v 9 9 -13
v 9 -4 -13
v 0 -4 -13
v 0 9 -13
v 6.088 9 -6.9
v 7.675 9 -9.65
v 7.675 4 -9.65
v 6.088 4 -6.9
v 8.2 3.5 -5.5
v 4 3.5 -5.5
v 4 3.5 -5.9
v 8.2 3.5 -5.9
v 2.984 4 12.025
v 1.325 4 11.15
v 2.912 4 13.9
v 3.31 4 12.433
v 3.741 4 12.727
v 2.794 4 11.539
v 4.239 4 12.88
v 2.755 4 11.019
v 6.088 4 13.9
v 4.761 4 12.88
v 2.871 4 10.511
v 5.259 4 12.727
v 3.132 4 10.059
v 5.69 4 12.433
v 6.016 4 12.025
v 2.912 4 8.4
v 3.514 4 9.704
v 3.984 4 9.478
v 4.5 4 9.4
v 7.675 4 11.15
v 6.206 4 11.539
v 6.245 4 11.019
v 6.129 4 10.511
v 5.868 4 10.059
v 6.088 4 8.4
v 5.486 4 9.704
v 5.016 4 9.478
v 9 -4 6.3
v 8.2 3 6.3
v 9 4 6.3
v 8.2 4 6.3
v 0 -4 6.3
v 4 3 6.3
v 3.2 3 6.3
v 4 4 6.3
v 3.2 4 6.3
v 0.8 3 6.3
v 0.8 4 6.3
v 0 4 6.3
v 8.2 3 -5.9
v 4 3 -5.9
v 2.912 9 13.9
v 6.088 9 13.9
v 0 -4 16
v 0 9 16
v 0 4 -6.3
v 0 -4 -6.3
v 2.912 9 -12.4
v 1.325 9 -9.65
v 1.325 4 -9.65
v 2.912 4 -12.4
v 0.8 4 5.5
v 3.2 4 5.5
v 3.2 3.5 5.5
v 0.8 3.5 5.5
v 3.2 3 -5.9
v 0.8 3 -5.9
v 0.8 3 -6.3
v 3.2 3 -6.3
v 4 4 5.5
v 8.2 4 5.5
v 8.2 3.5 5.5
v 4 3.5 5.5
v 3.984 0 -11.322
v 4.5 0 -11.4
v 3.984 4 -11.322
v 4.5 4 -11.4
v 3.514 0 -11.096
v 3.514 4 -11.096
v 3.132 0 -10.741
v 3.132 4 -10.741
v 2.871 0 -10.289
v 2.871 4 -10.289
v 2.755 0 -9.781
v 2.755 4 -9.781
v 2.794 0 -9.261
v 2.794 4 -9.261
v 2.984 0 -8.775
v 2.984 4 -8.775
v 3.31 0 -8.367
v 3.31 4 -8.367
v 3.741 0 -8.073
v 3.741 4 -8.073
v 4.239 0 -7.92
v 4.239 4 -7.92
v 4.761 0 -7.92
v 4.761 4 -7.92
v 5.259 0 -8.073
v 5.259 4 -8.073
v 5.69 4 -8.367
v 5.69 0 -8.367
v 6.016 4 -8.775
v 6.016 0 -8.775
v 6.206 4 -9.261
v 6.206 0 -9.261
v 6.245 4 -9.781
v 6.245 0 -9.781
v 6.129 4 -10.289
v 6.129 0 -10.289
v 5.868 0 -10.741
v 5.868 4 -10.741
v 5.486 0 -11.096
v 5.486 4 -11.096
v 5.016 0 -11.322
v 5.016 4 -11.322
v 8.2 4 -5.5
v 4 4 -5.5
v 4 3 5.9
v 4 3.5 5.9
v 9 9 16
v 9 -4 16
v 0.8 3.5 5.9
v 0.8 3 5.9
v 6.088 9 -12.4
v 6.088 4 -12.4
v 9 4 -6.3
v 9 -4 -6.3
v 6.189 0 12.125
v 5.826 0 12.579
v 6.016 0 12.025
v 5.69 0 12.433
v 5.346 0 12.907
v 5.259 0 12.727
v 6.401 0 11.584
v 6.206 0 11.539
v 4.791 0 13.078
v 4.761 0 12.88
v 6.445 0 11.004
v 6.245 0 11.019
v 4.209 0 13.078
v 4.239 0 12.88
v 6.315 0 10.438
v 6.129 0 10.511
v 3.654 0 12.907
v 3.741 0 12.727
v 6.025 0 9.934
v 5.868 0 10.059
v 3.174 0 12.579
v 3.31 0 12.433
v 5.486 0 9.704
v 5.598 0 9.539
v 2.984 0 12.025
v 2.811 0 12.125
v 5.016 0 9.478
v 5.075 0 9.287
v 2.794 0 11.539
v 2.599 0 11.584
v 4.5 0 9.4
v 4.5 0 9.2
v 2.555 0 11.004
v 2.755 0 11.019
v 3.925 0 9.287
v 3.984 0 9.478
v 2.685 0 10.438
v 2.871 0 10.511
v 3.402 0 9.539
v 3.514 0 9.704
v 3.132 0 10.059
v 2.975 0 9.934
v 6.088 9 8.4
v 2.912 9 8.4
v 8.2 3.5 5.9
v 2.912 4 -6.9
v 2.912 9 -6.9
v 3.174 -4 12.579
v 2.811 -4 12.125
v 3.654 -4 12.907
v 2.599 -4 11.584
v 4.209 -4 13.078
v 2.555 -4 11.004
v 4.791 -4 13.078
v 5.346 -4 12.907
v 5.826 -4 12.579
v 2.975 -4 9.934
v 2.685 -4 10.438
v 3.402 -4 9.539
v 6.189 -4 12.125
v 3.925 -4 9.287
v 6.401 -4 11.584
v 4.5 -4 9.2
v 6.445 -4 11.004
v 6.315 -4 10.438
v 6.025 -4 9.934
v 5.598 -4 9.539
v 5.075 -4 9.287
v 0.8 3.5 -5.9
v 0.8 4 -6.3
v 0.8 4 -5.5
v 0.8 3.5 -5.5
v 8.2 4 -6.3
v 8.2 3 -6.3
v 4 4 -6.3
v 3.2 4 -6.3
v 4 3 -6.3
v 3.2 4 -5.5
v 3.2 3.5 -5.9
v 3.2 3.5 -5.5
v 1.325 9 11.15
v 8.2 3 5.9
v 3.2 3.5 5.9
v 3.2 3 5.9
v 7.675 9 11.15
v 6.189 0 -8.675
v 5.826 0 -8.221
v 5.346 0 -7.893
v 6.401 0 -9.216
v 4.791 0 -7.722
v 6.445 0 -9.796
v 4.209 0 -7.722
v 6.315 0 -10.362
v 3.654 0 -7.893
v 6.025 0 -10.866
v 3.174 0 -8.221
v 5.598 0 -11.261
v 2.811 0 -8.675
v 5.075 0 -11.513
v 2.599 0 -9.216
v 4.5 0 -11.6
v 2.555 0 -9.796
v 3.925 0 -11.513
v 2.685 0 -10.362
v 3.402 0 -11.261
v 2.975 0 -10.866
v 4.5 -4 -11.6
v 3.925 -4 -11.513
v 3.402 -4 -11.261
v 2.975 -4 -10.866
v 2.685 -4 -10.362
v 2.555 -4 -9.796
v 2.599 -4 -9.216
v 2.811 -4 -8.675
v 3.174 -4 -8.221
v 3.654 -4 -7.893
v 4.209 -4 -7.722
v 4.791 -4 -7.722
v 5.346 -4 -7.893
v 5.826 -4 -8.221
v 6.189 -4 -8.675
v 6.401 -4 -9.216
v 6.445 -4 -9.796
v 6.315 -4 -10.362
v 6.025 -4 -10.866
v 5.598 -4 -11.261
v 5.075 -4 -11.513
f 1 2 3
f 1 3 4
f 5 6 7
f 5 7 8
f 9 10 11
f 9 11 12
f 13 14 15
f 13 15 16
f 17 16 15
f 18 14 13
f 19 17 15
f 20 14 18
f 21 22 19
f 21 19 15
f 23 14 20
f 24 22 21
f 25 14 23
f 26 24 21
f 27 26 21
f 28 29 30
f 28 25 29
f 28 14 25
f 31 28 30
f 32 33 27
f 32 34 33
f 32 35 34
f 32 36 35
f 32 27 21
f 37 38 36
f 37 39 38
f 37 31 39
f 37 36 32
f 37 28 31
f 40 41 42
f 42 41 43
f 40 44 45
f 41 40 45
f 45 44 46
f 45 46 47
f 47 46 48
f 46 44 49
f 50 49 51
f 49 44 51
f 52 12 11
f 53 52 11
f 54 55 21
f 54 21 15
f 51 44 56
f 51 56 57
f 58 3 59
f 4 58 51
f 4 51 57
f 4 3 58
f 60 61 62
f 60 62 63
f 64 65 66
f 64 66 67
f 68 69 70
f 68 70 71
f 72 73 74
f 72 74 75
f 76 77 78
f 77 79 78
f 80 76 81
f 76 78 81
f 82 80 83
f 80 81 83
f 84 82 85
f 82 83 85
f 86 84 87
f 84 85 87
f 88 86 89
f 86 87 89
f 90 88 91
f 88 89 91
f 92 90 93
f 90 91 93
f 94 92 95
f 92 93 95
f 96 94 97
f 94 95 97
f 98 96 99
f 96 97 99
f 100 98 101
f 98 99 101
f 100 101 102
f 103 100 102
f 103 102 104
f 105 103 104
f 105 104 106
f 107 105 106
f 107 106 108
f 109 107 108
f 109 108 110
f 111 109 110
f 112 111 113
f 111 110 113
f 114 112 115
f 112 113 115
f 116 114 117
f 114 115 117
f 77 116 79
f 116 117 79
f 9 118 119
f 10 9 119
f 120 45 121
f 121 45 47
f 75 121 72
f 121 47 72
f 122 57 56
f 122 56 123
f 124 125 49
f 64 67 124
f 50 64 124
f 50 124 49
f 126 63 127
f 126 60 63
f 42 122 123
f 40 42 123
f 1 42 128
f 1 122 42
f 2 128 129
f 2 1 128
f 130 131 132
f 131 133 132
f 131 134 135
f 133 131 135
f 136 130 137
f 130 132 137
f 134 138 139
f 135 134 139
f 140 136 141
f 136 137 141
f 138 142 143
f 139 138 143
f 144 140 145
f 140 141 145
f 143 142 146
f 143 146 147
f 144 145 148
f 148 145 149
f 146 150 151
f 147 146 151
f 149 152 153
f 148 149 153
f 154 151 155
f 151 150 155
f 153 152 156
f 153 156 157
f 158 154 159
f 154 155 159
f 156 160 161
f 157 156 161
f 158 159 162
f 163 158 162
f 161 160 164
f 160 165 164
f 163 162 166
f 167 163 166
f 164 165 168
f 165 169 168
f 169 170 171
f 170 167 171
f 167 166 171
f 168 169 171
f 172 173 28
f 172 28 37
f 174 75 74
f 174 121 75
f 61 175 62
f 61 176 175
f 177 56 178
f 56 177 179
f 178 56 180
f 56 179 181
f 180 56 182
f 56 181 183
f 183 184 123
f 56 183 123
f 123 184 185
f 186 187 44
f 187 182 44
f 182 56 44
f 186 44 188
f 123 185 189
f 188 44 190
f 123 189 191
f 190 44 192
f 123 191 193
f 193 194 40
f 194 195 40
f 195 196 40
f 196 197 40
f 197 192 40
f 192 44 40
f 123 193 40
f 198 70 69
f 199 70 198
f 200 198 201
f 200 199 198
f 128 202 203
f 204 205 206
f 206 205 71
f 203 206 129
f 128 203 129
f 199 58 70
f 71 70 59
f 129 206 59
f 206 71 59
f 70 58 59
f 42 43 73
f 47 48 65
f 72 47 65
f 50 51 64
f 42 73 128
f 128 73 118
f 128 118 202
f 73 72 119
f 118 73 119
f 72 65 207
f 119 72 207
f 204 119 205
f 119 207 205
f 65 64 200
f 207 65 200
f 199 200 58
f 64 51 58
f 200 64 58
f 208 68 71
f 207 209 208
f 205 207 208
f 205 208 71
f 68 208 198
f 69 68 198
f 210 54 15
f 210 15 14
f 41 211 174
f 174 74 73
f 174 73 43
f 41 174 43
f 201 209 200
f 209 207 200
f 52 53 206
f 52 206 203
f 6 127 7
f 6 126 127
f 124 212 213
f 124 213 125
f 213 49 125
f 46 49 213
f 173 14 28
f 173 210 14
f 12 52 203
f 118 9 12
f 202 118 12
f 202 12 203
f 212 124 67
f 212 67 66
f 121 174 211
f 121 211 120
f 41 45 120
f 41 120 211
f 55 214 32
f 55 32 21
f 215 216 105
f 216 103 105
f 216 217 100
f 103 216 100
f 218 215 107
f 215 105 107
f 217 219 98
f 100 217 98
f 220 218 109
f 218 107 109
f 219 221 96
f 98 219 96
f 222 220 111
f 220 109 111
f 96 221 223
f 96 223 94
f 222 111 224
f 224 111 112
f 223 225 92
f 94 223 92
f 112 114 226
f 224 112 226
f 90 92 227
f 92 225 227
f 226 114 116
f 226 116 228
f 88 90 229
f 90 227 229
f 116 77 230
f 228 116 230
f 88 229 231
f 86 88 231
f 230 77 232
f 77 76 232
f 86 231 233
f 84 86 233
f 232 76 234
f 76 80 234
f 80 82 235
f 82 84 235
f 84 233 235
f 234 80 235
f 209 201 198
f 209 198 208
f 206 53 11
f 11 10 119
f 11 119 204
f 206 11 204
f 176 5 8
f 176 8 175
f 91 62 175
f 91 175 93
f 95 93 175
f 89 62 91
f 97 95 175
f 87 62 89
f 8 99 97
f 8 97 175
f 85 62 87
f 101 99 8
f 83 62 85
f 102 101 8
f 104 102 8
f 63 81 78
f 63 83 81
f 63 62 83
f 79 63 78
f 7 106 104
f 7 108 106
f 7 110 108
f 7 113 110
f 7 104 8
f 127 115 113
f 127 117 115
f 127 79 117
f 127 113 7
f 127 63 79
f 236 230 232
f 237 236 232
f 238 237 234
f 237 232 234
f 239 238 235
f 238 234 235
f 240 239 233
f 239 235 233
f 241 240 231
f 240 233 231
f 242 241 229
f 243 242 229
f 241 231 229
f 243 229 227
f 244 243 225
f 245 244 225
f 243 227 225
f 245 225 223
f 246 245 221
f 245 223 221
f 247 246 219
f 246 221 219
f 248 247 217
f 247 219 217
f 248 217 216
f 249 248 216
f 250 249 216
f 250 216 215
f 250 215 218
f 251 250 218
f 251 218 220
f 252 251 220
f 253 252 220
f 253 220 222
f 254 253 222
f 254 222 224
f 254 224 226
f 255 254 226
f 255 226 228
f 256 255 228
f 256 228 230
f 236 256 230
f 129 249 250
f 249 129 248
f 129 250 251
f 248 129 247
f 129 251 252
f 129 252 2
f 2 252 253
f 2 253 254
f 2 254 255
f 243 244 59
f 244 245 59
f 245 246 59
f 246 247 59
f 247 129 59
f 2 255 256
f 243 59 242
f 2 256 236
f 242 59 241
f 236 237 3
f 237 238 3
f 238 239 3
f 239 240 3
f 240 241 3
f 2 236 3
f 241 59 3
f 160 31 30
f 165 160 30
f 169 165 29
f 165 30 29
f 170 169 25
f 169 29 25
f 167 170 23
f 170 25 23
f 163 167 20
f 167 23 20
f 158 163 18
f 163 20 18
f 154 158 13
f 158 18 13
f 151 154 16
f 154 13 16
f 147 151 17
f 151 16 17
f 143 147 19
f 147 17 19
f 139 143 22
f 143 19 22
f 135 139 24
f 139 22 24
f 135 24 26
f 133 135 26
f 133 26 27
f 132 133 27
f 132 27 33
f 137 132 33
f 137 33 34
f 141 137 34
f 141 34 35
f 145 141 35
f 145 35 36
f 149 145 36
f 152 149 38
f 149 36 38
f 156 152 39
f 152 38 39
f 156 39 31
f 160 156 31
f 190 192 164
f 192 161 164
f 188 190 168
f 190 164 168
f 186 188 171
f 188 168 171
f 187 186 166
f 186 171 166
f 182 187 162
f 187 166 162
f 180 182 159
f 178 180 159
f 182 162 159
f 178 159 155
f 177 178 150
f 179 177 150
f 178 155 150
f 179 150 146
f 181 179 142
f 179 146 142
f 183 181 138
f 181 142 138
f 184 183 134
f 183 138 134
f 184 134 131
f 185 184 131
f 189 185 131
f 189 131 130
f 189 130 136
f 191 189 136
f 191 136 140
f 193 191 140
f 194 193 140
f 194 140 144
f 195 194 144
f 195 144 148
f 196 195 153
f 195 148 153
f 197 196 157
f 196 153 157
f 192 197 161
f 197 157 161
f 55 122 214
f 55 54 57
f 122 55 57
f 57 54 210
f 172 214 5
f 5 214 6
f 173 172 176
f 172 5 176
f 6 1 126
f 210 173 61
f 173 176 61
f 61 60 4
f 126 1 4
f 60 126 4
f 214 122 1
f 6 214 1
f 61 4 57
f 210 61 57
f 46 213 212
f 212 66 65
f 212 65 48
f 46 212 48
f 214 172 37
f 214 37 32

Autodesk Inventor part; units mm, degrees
ref_plane "YZ Plane" through (0, 0, 0) normal (1, 0, 0) x (0, 1, 0)
ref_plane "XZ Plane" through (0, 0, 0) normal (0, 1, 0) x (-1, 0, 0)
ref_plane "XY Plane" through (0, 0, 0) normal (0, 0, 1) x (1, 0, 0)
sketch "Szkic1" plane through (0, 0, 0) normal (1, 0, 0) x (0, 1, 0)
  line L0 (-4, 6.3) -> (4, 6.3)
  line L1 (4, 6.3) -> (4, -6.3)
  line L2 (4, -6.3) -> (-4, -6.3)
  line L3 (-4, 6.3) -> (-4, 13)
  line L4 (-4, -6.3) -> (-4, -13)
  line L5 (-1, -13) -> (-1, -9.3)
  line L6 (-1, -9.3) -> (7, -9.3)
  line L7 (7, -9.3) -> (7, 9.3)
  line L8 (7, 9.3) -> (-1, 9.3)
  line L9 (-1, 9.3) -> (-1, 13)
  line L10 (-4, 13) -> (-1, 13)
  line L11 (-4, -13) -> (-1, -13)
  point P0 (0, 0)
  point P1 (0, 6.3)
  point P2 (4, 0)
  dimension "d0" = 8
  dimension "d1" = 12.6
  dimension "d2" = 6.7
  dimension "d3" = 6.7
  dimension "d4" = 3
extrude "Wyciągnięcie proste1" add sketch "Szkic1" along normal blind 9
sketch "Szkic2" plane through (0, 4, -6.3) normal (0, -1, 0) x (1, 0, 0)
  line L0 (0, 12.6) -> (0, 0) projected
  line L1 (0, 0) -> (9, 0) projected
  line L2 (9, 12.6) -> (9, 0) projected
  line L3 (0, 12.6) -> (9, 12.6) projected
  line L4 (8.2, 12.6) -> (8.2, 0)
  line L5 (4, 12.6) -> (4, 0)
  line L6 (3.2, 12.6) -> (3.2, 0)
  line L7 (0.8, 0) -> (0.8, 12.6)
  line L8 (0.8, 12.6) -> (3.2, 12.6)
  line L9 (3.2, 12.6) -> (3.2, 11.8)
  line L10 (3.2, 11.8) -> (0.8, 11.8)
  line L11 (0.8, 11.8) -> (0.8, 12.6)
  line L12 (0.8, 0) -> (3.2, 0)
  line L13 (3.2, 0) -> (3.2, 0.8)
  line L14 (3.2, 0.8) -> (0.8, 0.8)
  line L15 (0.8, 0.8) -> (0.8, 0)
  line L16 (4, 12.6) -> (8.2, 12.6)
  line L17 (8.2, 12.6) -> (8.2, 11.8)
  line L18 (8.2, 11.8) -> (4, 11.8)
  line L19 (4, 11.8) -> (4, 12.6)
  line L20 (4, 0) -> (8.2, 0)
  line L21 (8.2, 0) -> (8.2, 0.8)
  line L22 (8.2, 0.8) -> (4, 0.8)
  line L23 (4, 0.8) -> (4, 0)
  point P0 (0, 6.3)
  point P1 (4, 0.8)
  point P2 (0.8, 0.8)
  point P3 (0.8, 11.8)
  dimension "d7" = 0.8
  dimension "d8" = 4.2
  dimension "d9" = 0.8
  dimension "d10" = 2.4
  dimension "d11" = 0.8
  dimension "d12" = 0.8
  dimension "d13" = 0.8
  dimension "d14" = 0.8
extrude "Wyciągnięcie proste2" add sketch "Szkic2" along normal blind 0.5 contours L3 L6 L10 L7 | L7 L14 L6 L1 | L3 L4 L18 L5 | L5 L22 L4 L1
sketch "Szkic3" plane through (0, 3.5, -6.3) normal (0, -1, 0) x (1, 0, 0)
  line L0 (8.2, 11.8) -> (8.2, 12.6) projected
  line L1 (4, 12.6) -> (8.2, 12.6) projected
  line L2 (4, 12.6) -> (4, 11.8) projected
  line L3 (4, 11.8) -> (8.2, 11.8) projected
  line L4 (3.2, 11.8) -> (3.2, 12.6) projected
  line L5 (0.8, 12.6) -> (3.2, 12.6) projected
  line L6 (0.8, 12.6) -> (0.8, 11.8) projected
  line L7 (0.8, 11.8) -> (3.2, 11.8) projected
  line L8 (0.8, 0.8) -> (0.8, 0) projected
  line L9 (3.2, 0) -> (0.8, 0) projected
  line L10 (3.2, 0) -> (3.2, 0.8) projected
  line L11 (3.2, 0.8) -> (0.8, 0.8) projected
  line L12 (4, 0.8) -> (4, 0) projected
  line L13 (8.2, 0) -> (4, 0) projected
  line L14 (8.2, 0) -> (8.2, 0.8) projected
  line L15 (8.2, 0.8) -> (4, 0.8) projected
  line L16 (8.2, 12.6) -> (8.2, 11.8) projected
  line L17 (8.2, 12.2) -> (0.8, 12.2)
  line L18 (8.2, 0.4) -> (0.8, 0.4)
  point P0 (0, 6.3)
  point P1 (4, 0.4)
  point P2 (3.2, 0.4)
  point P3 (4, 12.2)
  point P4 (3.2, 12.2)
extrude "Wyciągnięcie proste3" add sketch "Szkic3" along normal blind 0.5 contours L17 L6 L5 L4 | L17 L2 L1 L0 | L18 L14 L13 L12 | L18 L10 L9 L8
sketch "Szkic4" plane through (9, 0, 0) normal (1, 0, 0) x (0, 0, -1)
  line L0 (-6.3, -4) -> (-6.3, 4) projected
  line L1 (-6.3, 4) -> (6.3, 4) projected
  line L2 (6.3, 4) -> (6.3, -4) projected
  line L3 (6.3, -4) -> (13, -4) projected
  line L4 (13, -4) -> (13, -1) projected
  line L5 (13, -1) -> (9.3, -1) projected
  line L6 (9.3, -1) -> (9.3, 7) projected
  line L7 (9.3, 7) -> (-9.3, 7) projected
  line L8 (-9.3, 7) -> (-9.3, -1) projected
  line L9 (-9.3, -1) -> (-13, -1) projected
  line L10 (-13, -1) -> (-13, -4) projected
  line L11 (-13, -4) -> (-6.3, -4) projected
  line L12 (-13, -1) -> (13, -1)
  line L13 (13, -1) -> (13, 9)
  line L14 (13, 9) -> (-13, 9)
  line L15 (-13, 9) -> (-13, -1)
  point P0 (0, 0)
  dimension "d19" = 10
extrude "Wyciągnięcie proste4" add sketch "Szkic4" against normal up to surface (9 mm away) contours L9 L15 L14 L13 L5 L6 L7 L8
sketch "Szkic5" plane through (0, -4, 13) normal (0, 0, 1) x (1, 0, 0)
  line L0 (0, 0) -> (0, 13) projected
  line L1 (0, 0) -> (9, 0) projected
  line L2 (9, 13) -> (9, 0) projected
  line L3 (9, 13) -> (0, 13) projected
  point P0 (0, 4)
extrude "Wyciągnięcie proste5" add sketch "Szkic5" along normal blind 3
sketch "Szkic6" plane through (0, -4, -13) normal (0, -1, 0) x (1, 0, 0)
  line L0 (0, 0) -> (9, 0) projected
  line L1 (0, 6.7) -> (9, 6.7) projected
  line L2 (0, 19.3) -> (9, 19.3) projected
  line L3 (0, 29) -> (9, 29) projected
  line L4 (4.5, 0) -> (4.5, 6.7) construction
  line L5 (4.5, 19.3) -> (4.5, 29) construction
  point P0 (0, 13)
  point P1 (4.5, 3.35)
  point P2 (4.5, 24.15)
hole "Otwór1" at (4.5, -4, -9.65) at (4.5, -4, 11.15) direction (0, 1, 0) diameter 3.5 depth 8 counterbore diameter 3.9 counterbore depth 4
sketch "Szkic7" plane through (0, 9, -13) normal (0, 1, 0) x (1, 0, 0)
  circle A0 centre (4.5, -3.35) radius 1.75 projected
  circle A1 centre (4.5, -24.15) radius 1.75 projected
  circle A2 centre (4.5, -3.35) radius 2.75
  circle A3 centre (4.5, -24.15) radius 2.75
  line L0 (6.0877, -0.6) -> (7.6754, -3.35)
  line L1 (7.6754, -3.35) -> (6.0877, -6.1)
  line L2 (6.0877, -6.1) -> (2.9123, -6.1)
  line L3 (2.9123, -6.1) -> (1.3246, -3.35)
  line L4 (1.3246, -3.35) -> (2.9123, -0.6)
  line L5 (2.9123, -0.6) -> (6.0877, -0.6)
  line L6 (2.9123, -26.9) -> (1.3246, -24.15)
  line L7 (1.3246, -24.15) -> (2.9123, -21.4)
  line L8 (2.9123, -21.4) -> (6.0877, -21.4)
  line L9 (6.0877, -21.4) -> (7.6754, -24.15)
  line L10 (7.6754, -24.15) -> (6.0877, -26.9)
  line L11 (6.0877, -26.9) -> (2.9123, -26.9)
  point P0 (0, -13)
  point P1 (4.5, -0.6)
  point P2 (4.5, -26.9)
  dimension "d31" = 5.5
  dimension "d32" = 5.5
extrude "Wyciągnięcie proste6" cut sketch "Szkic7" against normal blind 5 contours A0 | A1 | A2 | A2 L0 L1 | A2 L5 L0 | L1 L2 A2 | A2 L4 L5 | L2 L3 A2 | A2 L3 L4 | A3 | A3 L9 L10 | A3 L8 L9 | L10 L11 A3 | A3 L7 L8 | L11 L6 A3 | A3 L6 L7
properties part number "motor_bracket"
